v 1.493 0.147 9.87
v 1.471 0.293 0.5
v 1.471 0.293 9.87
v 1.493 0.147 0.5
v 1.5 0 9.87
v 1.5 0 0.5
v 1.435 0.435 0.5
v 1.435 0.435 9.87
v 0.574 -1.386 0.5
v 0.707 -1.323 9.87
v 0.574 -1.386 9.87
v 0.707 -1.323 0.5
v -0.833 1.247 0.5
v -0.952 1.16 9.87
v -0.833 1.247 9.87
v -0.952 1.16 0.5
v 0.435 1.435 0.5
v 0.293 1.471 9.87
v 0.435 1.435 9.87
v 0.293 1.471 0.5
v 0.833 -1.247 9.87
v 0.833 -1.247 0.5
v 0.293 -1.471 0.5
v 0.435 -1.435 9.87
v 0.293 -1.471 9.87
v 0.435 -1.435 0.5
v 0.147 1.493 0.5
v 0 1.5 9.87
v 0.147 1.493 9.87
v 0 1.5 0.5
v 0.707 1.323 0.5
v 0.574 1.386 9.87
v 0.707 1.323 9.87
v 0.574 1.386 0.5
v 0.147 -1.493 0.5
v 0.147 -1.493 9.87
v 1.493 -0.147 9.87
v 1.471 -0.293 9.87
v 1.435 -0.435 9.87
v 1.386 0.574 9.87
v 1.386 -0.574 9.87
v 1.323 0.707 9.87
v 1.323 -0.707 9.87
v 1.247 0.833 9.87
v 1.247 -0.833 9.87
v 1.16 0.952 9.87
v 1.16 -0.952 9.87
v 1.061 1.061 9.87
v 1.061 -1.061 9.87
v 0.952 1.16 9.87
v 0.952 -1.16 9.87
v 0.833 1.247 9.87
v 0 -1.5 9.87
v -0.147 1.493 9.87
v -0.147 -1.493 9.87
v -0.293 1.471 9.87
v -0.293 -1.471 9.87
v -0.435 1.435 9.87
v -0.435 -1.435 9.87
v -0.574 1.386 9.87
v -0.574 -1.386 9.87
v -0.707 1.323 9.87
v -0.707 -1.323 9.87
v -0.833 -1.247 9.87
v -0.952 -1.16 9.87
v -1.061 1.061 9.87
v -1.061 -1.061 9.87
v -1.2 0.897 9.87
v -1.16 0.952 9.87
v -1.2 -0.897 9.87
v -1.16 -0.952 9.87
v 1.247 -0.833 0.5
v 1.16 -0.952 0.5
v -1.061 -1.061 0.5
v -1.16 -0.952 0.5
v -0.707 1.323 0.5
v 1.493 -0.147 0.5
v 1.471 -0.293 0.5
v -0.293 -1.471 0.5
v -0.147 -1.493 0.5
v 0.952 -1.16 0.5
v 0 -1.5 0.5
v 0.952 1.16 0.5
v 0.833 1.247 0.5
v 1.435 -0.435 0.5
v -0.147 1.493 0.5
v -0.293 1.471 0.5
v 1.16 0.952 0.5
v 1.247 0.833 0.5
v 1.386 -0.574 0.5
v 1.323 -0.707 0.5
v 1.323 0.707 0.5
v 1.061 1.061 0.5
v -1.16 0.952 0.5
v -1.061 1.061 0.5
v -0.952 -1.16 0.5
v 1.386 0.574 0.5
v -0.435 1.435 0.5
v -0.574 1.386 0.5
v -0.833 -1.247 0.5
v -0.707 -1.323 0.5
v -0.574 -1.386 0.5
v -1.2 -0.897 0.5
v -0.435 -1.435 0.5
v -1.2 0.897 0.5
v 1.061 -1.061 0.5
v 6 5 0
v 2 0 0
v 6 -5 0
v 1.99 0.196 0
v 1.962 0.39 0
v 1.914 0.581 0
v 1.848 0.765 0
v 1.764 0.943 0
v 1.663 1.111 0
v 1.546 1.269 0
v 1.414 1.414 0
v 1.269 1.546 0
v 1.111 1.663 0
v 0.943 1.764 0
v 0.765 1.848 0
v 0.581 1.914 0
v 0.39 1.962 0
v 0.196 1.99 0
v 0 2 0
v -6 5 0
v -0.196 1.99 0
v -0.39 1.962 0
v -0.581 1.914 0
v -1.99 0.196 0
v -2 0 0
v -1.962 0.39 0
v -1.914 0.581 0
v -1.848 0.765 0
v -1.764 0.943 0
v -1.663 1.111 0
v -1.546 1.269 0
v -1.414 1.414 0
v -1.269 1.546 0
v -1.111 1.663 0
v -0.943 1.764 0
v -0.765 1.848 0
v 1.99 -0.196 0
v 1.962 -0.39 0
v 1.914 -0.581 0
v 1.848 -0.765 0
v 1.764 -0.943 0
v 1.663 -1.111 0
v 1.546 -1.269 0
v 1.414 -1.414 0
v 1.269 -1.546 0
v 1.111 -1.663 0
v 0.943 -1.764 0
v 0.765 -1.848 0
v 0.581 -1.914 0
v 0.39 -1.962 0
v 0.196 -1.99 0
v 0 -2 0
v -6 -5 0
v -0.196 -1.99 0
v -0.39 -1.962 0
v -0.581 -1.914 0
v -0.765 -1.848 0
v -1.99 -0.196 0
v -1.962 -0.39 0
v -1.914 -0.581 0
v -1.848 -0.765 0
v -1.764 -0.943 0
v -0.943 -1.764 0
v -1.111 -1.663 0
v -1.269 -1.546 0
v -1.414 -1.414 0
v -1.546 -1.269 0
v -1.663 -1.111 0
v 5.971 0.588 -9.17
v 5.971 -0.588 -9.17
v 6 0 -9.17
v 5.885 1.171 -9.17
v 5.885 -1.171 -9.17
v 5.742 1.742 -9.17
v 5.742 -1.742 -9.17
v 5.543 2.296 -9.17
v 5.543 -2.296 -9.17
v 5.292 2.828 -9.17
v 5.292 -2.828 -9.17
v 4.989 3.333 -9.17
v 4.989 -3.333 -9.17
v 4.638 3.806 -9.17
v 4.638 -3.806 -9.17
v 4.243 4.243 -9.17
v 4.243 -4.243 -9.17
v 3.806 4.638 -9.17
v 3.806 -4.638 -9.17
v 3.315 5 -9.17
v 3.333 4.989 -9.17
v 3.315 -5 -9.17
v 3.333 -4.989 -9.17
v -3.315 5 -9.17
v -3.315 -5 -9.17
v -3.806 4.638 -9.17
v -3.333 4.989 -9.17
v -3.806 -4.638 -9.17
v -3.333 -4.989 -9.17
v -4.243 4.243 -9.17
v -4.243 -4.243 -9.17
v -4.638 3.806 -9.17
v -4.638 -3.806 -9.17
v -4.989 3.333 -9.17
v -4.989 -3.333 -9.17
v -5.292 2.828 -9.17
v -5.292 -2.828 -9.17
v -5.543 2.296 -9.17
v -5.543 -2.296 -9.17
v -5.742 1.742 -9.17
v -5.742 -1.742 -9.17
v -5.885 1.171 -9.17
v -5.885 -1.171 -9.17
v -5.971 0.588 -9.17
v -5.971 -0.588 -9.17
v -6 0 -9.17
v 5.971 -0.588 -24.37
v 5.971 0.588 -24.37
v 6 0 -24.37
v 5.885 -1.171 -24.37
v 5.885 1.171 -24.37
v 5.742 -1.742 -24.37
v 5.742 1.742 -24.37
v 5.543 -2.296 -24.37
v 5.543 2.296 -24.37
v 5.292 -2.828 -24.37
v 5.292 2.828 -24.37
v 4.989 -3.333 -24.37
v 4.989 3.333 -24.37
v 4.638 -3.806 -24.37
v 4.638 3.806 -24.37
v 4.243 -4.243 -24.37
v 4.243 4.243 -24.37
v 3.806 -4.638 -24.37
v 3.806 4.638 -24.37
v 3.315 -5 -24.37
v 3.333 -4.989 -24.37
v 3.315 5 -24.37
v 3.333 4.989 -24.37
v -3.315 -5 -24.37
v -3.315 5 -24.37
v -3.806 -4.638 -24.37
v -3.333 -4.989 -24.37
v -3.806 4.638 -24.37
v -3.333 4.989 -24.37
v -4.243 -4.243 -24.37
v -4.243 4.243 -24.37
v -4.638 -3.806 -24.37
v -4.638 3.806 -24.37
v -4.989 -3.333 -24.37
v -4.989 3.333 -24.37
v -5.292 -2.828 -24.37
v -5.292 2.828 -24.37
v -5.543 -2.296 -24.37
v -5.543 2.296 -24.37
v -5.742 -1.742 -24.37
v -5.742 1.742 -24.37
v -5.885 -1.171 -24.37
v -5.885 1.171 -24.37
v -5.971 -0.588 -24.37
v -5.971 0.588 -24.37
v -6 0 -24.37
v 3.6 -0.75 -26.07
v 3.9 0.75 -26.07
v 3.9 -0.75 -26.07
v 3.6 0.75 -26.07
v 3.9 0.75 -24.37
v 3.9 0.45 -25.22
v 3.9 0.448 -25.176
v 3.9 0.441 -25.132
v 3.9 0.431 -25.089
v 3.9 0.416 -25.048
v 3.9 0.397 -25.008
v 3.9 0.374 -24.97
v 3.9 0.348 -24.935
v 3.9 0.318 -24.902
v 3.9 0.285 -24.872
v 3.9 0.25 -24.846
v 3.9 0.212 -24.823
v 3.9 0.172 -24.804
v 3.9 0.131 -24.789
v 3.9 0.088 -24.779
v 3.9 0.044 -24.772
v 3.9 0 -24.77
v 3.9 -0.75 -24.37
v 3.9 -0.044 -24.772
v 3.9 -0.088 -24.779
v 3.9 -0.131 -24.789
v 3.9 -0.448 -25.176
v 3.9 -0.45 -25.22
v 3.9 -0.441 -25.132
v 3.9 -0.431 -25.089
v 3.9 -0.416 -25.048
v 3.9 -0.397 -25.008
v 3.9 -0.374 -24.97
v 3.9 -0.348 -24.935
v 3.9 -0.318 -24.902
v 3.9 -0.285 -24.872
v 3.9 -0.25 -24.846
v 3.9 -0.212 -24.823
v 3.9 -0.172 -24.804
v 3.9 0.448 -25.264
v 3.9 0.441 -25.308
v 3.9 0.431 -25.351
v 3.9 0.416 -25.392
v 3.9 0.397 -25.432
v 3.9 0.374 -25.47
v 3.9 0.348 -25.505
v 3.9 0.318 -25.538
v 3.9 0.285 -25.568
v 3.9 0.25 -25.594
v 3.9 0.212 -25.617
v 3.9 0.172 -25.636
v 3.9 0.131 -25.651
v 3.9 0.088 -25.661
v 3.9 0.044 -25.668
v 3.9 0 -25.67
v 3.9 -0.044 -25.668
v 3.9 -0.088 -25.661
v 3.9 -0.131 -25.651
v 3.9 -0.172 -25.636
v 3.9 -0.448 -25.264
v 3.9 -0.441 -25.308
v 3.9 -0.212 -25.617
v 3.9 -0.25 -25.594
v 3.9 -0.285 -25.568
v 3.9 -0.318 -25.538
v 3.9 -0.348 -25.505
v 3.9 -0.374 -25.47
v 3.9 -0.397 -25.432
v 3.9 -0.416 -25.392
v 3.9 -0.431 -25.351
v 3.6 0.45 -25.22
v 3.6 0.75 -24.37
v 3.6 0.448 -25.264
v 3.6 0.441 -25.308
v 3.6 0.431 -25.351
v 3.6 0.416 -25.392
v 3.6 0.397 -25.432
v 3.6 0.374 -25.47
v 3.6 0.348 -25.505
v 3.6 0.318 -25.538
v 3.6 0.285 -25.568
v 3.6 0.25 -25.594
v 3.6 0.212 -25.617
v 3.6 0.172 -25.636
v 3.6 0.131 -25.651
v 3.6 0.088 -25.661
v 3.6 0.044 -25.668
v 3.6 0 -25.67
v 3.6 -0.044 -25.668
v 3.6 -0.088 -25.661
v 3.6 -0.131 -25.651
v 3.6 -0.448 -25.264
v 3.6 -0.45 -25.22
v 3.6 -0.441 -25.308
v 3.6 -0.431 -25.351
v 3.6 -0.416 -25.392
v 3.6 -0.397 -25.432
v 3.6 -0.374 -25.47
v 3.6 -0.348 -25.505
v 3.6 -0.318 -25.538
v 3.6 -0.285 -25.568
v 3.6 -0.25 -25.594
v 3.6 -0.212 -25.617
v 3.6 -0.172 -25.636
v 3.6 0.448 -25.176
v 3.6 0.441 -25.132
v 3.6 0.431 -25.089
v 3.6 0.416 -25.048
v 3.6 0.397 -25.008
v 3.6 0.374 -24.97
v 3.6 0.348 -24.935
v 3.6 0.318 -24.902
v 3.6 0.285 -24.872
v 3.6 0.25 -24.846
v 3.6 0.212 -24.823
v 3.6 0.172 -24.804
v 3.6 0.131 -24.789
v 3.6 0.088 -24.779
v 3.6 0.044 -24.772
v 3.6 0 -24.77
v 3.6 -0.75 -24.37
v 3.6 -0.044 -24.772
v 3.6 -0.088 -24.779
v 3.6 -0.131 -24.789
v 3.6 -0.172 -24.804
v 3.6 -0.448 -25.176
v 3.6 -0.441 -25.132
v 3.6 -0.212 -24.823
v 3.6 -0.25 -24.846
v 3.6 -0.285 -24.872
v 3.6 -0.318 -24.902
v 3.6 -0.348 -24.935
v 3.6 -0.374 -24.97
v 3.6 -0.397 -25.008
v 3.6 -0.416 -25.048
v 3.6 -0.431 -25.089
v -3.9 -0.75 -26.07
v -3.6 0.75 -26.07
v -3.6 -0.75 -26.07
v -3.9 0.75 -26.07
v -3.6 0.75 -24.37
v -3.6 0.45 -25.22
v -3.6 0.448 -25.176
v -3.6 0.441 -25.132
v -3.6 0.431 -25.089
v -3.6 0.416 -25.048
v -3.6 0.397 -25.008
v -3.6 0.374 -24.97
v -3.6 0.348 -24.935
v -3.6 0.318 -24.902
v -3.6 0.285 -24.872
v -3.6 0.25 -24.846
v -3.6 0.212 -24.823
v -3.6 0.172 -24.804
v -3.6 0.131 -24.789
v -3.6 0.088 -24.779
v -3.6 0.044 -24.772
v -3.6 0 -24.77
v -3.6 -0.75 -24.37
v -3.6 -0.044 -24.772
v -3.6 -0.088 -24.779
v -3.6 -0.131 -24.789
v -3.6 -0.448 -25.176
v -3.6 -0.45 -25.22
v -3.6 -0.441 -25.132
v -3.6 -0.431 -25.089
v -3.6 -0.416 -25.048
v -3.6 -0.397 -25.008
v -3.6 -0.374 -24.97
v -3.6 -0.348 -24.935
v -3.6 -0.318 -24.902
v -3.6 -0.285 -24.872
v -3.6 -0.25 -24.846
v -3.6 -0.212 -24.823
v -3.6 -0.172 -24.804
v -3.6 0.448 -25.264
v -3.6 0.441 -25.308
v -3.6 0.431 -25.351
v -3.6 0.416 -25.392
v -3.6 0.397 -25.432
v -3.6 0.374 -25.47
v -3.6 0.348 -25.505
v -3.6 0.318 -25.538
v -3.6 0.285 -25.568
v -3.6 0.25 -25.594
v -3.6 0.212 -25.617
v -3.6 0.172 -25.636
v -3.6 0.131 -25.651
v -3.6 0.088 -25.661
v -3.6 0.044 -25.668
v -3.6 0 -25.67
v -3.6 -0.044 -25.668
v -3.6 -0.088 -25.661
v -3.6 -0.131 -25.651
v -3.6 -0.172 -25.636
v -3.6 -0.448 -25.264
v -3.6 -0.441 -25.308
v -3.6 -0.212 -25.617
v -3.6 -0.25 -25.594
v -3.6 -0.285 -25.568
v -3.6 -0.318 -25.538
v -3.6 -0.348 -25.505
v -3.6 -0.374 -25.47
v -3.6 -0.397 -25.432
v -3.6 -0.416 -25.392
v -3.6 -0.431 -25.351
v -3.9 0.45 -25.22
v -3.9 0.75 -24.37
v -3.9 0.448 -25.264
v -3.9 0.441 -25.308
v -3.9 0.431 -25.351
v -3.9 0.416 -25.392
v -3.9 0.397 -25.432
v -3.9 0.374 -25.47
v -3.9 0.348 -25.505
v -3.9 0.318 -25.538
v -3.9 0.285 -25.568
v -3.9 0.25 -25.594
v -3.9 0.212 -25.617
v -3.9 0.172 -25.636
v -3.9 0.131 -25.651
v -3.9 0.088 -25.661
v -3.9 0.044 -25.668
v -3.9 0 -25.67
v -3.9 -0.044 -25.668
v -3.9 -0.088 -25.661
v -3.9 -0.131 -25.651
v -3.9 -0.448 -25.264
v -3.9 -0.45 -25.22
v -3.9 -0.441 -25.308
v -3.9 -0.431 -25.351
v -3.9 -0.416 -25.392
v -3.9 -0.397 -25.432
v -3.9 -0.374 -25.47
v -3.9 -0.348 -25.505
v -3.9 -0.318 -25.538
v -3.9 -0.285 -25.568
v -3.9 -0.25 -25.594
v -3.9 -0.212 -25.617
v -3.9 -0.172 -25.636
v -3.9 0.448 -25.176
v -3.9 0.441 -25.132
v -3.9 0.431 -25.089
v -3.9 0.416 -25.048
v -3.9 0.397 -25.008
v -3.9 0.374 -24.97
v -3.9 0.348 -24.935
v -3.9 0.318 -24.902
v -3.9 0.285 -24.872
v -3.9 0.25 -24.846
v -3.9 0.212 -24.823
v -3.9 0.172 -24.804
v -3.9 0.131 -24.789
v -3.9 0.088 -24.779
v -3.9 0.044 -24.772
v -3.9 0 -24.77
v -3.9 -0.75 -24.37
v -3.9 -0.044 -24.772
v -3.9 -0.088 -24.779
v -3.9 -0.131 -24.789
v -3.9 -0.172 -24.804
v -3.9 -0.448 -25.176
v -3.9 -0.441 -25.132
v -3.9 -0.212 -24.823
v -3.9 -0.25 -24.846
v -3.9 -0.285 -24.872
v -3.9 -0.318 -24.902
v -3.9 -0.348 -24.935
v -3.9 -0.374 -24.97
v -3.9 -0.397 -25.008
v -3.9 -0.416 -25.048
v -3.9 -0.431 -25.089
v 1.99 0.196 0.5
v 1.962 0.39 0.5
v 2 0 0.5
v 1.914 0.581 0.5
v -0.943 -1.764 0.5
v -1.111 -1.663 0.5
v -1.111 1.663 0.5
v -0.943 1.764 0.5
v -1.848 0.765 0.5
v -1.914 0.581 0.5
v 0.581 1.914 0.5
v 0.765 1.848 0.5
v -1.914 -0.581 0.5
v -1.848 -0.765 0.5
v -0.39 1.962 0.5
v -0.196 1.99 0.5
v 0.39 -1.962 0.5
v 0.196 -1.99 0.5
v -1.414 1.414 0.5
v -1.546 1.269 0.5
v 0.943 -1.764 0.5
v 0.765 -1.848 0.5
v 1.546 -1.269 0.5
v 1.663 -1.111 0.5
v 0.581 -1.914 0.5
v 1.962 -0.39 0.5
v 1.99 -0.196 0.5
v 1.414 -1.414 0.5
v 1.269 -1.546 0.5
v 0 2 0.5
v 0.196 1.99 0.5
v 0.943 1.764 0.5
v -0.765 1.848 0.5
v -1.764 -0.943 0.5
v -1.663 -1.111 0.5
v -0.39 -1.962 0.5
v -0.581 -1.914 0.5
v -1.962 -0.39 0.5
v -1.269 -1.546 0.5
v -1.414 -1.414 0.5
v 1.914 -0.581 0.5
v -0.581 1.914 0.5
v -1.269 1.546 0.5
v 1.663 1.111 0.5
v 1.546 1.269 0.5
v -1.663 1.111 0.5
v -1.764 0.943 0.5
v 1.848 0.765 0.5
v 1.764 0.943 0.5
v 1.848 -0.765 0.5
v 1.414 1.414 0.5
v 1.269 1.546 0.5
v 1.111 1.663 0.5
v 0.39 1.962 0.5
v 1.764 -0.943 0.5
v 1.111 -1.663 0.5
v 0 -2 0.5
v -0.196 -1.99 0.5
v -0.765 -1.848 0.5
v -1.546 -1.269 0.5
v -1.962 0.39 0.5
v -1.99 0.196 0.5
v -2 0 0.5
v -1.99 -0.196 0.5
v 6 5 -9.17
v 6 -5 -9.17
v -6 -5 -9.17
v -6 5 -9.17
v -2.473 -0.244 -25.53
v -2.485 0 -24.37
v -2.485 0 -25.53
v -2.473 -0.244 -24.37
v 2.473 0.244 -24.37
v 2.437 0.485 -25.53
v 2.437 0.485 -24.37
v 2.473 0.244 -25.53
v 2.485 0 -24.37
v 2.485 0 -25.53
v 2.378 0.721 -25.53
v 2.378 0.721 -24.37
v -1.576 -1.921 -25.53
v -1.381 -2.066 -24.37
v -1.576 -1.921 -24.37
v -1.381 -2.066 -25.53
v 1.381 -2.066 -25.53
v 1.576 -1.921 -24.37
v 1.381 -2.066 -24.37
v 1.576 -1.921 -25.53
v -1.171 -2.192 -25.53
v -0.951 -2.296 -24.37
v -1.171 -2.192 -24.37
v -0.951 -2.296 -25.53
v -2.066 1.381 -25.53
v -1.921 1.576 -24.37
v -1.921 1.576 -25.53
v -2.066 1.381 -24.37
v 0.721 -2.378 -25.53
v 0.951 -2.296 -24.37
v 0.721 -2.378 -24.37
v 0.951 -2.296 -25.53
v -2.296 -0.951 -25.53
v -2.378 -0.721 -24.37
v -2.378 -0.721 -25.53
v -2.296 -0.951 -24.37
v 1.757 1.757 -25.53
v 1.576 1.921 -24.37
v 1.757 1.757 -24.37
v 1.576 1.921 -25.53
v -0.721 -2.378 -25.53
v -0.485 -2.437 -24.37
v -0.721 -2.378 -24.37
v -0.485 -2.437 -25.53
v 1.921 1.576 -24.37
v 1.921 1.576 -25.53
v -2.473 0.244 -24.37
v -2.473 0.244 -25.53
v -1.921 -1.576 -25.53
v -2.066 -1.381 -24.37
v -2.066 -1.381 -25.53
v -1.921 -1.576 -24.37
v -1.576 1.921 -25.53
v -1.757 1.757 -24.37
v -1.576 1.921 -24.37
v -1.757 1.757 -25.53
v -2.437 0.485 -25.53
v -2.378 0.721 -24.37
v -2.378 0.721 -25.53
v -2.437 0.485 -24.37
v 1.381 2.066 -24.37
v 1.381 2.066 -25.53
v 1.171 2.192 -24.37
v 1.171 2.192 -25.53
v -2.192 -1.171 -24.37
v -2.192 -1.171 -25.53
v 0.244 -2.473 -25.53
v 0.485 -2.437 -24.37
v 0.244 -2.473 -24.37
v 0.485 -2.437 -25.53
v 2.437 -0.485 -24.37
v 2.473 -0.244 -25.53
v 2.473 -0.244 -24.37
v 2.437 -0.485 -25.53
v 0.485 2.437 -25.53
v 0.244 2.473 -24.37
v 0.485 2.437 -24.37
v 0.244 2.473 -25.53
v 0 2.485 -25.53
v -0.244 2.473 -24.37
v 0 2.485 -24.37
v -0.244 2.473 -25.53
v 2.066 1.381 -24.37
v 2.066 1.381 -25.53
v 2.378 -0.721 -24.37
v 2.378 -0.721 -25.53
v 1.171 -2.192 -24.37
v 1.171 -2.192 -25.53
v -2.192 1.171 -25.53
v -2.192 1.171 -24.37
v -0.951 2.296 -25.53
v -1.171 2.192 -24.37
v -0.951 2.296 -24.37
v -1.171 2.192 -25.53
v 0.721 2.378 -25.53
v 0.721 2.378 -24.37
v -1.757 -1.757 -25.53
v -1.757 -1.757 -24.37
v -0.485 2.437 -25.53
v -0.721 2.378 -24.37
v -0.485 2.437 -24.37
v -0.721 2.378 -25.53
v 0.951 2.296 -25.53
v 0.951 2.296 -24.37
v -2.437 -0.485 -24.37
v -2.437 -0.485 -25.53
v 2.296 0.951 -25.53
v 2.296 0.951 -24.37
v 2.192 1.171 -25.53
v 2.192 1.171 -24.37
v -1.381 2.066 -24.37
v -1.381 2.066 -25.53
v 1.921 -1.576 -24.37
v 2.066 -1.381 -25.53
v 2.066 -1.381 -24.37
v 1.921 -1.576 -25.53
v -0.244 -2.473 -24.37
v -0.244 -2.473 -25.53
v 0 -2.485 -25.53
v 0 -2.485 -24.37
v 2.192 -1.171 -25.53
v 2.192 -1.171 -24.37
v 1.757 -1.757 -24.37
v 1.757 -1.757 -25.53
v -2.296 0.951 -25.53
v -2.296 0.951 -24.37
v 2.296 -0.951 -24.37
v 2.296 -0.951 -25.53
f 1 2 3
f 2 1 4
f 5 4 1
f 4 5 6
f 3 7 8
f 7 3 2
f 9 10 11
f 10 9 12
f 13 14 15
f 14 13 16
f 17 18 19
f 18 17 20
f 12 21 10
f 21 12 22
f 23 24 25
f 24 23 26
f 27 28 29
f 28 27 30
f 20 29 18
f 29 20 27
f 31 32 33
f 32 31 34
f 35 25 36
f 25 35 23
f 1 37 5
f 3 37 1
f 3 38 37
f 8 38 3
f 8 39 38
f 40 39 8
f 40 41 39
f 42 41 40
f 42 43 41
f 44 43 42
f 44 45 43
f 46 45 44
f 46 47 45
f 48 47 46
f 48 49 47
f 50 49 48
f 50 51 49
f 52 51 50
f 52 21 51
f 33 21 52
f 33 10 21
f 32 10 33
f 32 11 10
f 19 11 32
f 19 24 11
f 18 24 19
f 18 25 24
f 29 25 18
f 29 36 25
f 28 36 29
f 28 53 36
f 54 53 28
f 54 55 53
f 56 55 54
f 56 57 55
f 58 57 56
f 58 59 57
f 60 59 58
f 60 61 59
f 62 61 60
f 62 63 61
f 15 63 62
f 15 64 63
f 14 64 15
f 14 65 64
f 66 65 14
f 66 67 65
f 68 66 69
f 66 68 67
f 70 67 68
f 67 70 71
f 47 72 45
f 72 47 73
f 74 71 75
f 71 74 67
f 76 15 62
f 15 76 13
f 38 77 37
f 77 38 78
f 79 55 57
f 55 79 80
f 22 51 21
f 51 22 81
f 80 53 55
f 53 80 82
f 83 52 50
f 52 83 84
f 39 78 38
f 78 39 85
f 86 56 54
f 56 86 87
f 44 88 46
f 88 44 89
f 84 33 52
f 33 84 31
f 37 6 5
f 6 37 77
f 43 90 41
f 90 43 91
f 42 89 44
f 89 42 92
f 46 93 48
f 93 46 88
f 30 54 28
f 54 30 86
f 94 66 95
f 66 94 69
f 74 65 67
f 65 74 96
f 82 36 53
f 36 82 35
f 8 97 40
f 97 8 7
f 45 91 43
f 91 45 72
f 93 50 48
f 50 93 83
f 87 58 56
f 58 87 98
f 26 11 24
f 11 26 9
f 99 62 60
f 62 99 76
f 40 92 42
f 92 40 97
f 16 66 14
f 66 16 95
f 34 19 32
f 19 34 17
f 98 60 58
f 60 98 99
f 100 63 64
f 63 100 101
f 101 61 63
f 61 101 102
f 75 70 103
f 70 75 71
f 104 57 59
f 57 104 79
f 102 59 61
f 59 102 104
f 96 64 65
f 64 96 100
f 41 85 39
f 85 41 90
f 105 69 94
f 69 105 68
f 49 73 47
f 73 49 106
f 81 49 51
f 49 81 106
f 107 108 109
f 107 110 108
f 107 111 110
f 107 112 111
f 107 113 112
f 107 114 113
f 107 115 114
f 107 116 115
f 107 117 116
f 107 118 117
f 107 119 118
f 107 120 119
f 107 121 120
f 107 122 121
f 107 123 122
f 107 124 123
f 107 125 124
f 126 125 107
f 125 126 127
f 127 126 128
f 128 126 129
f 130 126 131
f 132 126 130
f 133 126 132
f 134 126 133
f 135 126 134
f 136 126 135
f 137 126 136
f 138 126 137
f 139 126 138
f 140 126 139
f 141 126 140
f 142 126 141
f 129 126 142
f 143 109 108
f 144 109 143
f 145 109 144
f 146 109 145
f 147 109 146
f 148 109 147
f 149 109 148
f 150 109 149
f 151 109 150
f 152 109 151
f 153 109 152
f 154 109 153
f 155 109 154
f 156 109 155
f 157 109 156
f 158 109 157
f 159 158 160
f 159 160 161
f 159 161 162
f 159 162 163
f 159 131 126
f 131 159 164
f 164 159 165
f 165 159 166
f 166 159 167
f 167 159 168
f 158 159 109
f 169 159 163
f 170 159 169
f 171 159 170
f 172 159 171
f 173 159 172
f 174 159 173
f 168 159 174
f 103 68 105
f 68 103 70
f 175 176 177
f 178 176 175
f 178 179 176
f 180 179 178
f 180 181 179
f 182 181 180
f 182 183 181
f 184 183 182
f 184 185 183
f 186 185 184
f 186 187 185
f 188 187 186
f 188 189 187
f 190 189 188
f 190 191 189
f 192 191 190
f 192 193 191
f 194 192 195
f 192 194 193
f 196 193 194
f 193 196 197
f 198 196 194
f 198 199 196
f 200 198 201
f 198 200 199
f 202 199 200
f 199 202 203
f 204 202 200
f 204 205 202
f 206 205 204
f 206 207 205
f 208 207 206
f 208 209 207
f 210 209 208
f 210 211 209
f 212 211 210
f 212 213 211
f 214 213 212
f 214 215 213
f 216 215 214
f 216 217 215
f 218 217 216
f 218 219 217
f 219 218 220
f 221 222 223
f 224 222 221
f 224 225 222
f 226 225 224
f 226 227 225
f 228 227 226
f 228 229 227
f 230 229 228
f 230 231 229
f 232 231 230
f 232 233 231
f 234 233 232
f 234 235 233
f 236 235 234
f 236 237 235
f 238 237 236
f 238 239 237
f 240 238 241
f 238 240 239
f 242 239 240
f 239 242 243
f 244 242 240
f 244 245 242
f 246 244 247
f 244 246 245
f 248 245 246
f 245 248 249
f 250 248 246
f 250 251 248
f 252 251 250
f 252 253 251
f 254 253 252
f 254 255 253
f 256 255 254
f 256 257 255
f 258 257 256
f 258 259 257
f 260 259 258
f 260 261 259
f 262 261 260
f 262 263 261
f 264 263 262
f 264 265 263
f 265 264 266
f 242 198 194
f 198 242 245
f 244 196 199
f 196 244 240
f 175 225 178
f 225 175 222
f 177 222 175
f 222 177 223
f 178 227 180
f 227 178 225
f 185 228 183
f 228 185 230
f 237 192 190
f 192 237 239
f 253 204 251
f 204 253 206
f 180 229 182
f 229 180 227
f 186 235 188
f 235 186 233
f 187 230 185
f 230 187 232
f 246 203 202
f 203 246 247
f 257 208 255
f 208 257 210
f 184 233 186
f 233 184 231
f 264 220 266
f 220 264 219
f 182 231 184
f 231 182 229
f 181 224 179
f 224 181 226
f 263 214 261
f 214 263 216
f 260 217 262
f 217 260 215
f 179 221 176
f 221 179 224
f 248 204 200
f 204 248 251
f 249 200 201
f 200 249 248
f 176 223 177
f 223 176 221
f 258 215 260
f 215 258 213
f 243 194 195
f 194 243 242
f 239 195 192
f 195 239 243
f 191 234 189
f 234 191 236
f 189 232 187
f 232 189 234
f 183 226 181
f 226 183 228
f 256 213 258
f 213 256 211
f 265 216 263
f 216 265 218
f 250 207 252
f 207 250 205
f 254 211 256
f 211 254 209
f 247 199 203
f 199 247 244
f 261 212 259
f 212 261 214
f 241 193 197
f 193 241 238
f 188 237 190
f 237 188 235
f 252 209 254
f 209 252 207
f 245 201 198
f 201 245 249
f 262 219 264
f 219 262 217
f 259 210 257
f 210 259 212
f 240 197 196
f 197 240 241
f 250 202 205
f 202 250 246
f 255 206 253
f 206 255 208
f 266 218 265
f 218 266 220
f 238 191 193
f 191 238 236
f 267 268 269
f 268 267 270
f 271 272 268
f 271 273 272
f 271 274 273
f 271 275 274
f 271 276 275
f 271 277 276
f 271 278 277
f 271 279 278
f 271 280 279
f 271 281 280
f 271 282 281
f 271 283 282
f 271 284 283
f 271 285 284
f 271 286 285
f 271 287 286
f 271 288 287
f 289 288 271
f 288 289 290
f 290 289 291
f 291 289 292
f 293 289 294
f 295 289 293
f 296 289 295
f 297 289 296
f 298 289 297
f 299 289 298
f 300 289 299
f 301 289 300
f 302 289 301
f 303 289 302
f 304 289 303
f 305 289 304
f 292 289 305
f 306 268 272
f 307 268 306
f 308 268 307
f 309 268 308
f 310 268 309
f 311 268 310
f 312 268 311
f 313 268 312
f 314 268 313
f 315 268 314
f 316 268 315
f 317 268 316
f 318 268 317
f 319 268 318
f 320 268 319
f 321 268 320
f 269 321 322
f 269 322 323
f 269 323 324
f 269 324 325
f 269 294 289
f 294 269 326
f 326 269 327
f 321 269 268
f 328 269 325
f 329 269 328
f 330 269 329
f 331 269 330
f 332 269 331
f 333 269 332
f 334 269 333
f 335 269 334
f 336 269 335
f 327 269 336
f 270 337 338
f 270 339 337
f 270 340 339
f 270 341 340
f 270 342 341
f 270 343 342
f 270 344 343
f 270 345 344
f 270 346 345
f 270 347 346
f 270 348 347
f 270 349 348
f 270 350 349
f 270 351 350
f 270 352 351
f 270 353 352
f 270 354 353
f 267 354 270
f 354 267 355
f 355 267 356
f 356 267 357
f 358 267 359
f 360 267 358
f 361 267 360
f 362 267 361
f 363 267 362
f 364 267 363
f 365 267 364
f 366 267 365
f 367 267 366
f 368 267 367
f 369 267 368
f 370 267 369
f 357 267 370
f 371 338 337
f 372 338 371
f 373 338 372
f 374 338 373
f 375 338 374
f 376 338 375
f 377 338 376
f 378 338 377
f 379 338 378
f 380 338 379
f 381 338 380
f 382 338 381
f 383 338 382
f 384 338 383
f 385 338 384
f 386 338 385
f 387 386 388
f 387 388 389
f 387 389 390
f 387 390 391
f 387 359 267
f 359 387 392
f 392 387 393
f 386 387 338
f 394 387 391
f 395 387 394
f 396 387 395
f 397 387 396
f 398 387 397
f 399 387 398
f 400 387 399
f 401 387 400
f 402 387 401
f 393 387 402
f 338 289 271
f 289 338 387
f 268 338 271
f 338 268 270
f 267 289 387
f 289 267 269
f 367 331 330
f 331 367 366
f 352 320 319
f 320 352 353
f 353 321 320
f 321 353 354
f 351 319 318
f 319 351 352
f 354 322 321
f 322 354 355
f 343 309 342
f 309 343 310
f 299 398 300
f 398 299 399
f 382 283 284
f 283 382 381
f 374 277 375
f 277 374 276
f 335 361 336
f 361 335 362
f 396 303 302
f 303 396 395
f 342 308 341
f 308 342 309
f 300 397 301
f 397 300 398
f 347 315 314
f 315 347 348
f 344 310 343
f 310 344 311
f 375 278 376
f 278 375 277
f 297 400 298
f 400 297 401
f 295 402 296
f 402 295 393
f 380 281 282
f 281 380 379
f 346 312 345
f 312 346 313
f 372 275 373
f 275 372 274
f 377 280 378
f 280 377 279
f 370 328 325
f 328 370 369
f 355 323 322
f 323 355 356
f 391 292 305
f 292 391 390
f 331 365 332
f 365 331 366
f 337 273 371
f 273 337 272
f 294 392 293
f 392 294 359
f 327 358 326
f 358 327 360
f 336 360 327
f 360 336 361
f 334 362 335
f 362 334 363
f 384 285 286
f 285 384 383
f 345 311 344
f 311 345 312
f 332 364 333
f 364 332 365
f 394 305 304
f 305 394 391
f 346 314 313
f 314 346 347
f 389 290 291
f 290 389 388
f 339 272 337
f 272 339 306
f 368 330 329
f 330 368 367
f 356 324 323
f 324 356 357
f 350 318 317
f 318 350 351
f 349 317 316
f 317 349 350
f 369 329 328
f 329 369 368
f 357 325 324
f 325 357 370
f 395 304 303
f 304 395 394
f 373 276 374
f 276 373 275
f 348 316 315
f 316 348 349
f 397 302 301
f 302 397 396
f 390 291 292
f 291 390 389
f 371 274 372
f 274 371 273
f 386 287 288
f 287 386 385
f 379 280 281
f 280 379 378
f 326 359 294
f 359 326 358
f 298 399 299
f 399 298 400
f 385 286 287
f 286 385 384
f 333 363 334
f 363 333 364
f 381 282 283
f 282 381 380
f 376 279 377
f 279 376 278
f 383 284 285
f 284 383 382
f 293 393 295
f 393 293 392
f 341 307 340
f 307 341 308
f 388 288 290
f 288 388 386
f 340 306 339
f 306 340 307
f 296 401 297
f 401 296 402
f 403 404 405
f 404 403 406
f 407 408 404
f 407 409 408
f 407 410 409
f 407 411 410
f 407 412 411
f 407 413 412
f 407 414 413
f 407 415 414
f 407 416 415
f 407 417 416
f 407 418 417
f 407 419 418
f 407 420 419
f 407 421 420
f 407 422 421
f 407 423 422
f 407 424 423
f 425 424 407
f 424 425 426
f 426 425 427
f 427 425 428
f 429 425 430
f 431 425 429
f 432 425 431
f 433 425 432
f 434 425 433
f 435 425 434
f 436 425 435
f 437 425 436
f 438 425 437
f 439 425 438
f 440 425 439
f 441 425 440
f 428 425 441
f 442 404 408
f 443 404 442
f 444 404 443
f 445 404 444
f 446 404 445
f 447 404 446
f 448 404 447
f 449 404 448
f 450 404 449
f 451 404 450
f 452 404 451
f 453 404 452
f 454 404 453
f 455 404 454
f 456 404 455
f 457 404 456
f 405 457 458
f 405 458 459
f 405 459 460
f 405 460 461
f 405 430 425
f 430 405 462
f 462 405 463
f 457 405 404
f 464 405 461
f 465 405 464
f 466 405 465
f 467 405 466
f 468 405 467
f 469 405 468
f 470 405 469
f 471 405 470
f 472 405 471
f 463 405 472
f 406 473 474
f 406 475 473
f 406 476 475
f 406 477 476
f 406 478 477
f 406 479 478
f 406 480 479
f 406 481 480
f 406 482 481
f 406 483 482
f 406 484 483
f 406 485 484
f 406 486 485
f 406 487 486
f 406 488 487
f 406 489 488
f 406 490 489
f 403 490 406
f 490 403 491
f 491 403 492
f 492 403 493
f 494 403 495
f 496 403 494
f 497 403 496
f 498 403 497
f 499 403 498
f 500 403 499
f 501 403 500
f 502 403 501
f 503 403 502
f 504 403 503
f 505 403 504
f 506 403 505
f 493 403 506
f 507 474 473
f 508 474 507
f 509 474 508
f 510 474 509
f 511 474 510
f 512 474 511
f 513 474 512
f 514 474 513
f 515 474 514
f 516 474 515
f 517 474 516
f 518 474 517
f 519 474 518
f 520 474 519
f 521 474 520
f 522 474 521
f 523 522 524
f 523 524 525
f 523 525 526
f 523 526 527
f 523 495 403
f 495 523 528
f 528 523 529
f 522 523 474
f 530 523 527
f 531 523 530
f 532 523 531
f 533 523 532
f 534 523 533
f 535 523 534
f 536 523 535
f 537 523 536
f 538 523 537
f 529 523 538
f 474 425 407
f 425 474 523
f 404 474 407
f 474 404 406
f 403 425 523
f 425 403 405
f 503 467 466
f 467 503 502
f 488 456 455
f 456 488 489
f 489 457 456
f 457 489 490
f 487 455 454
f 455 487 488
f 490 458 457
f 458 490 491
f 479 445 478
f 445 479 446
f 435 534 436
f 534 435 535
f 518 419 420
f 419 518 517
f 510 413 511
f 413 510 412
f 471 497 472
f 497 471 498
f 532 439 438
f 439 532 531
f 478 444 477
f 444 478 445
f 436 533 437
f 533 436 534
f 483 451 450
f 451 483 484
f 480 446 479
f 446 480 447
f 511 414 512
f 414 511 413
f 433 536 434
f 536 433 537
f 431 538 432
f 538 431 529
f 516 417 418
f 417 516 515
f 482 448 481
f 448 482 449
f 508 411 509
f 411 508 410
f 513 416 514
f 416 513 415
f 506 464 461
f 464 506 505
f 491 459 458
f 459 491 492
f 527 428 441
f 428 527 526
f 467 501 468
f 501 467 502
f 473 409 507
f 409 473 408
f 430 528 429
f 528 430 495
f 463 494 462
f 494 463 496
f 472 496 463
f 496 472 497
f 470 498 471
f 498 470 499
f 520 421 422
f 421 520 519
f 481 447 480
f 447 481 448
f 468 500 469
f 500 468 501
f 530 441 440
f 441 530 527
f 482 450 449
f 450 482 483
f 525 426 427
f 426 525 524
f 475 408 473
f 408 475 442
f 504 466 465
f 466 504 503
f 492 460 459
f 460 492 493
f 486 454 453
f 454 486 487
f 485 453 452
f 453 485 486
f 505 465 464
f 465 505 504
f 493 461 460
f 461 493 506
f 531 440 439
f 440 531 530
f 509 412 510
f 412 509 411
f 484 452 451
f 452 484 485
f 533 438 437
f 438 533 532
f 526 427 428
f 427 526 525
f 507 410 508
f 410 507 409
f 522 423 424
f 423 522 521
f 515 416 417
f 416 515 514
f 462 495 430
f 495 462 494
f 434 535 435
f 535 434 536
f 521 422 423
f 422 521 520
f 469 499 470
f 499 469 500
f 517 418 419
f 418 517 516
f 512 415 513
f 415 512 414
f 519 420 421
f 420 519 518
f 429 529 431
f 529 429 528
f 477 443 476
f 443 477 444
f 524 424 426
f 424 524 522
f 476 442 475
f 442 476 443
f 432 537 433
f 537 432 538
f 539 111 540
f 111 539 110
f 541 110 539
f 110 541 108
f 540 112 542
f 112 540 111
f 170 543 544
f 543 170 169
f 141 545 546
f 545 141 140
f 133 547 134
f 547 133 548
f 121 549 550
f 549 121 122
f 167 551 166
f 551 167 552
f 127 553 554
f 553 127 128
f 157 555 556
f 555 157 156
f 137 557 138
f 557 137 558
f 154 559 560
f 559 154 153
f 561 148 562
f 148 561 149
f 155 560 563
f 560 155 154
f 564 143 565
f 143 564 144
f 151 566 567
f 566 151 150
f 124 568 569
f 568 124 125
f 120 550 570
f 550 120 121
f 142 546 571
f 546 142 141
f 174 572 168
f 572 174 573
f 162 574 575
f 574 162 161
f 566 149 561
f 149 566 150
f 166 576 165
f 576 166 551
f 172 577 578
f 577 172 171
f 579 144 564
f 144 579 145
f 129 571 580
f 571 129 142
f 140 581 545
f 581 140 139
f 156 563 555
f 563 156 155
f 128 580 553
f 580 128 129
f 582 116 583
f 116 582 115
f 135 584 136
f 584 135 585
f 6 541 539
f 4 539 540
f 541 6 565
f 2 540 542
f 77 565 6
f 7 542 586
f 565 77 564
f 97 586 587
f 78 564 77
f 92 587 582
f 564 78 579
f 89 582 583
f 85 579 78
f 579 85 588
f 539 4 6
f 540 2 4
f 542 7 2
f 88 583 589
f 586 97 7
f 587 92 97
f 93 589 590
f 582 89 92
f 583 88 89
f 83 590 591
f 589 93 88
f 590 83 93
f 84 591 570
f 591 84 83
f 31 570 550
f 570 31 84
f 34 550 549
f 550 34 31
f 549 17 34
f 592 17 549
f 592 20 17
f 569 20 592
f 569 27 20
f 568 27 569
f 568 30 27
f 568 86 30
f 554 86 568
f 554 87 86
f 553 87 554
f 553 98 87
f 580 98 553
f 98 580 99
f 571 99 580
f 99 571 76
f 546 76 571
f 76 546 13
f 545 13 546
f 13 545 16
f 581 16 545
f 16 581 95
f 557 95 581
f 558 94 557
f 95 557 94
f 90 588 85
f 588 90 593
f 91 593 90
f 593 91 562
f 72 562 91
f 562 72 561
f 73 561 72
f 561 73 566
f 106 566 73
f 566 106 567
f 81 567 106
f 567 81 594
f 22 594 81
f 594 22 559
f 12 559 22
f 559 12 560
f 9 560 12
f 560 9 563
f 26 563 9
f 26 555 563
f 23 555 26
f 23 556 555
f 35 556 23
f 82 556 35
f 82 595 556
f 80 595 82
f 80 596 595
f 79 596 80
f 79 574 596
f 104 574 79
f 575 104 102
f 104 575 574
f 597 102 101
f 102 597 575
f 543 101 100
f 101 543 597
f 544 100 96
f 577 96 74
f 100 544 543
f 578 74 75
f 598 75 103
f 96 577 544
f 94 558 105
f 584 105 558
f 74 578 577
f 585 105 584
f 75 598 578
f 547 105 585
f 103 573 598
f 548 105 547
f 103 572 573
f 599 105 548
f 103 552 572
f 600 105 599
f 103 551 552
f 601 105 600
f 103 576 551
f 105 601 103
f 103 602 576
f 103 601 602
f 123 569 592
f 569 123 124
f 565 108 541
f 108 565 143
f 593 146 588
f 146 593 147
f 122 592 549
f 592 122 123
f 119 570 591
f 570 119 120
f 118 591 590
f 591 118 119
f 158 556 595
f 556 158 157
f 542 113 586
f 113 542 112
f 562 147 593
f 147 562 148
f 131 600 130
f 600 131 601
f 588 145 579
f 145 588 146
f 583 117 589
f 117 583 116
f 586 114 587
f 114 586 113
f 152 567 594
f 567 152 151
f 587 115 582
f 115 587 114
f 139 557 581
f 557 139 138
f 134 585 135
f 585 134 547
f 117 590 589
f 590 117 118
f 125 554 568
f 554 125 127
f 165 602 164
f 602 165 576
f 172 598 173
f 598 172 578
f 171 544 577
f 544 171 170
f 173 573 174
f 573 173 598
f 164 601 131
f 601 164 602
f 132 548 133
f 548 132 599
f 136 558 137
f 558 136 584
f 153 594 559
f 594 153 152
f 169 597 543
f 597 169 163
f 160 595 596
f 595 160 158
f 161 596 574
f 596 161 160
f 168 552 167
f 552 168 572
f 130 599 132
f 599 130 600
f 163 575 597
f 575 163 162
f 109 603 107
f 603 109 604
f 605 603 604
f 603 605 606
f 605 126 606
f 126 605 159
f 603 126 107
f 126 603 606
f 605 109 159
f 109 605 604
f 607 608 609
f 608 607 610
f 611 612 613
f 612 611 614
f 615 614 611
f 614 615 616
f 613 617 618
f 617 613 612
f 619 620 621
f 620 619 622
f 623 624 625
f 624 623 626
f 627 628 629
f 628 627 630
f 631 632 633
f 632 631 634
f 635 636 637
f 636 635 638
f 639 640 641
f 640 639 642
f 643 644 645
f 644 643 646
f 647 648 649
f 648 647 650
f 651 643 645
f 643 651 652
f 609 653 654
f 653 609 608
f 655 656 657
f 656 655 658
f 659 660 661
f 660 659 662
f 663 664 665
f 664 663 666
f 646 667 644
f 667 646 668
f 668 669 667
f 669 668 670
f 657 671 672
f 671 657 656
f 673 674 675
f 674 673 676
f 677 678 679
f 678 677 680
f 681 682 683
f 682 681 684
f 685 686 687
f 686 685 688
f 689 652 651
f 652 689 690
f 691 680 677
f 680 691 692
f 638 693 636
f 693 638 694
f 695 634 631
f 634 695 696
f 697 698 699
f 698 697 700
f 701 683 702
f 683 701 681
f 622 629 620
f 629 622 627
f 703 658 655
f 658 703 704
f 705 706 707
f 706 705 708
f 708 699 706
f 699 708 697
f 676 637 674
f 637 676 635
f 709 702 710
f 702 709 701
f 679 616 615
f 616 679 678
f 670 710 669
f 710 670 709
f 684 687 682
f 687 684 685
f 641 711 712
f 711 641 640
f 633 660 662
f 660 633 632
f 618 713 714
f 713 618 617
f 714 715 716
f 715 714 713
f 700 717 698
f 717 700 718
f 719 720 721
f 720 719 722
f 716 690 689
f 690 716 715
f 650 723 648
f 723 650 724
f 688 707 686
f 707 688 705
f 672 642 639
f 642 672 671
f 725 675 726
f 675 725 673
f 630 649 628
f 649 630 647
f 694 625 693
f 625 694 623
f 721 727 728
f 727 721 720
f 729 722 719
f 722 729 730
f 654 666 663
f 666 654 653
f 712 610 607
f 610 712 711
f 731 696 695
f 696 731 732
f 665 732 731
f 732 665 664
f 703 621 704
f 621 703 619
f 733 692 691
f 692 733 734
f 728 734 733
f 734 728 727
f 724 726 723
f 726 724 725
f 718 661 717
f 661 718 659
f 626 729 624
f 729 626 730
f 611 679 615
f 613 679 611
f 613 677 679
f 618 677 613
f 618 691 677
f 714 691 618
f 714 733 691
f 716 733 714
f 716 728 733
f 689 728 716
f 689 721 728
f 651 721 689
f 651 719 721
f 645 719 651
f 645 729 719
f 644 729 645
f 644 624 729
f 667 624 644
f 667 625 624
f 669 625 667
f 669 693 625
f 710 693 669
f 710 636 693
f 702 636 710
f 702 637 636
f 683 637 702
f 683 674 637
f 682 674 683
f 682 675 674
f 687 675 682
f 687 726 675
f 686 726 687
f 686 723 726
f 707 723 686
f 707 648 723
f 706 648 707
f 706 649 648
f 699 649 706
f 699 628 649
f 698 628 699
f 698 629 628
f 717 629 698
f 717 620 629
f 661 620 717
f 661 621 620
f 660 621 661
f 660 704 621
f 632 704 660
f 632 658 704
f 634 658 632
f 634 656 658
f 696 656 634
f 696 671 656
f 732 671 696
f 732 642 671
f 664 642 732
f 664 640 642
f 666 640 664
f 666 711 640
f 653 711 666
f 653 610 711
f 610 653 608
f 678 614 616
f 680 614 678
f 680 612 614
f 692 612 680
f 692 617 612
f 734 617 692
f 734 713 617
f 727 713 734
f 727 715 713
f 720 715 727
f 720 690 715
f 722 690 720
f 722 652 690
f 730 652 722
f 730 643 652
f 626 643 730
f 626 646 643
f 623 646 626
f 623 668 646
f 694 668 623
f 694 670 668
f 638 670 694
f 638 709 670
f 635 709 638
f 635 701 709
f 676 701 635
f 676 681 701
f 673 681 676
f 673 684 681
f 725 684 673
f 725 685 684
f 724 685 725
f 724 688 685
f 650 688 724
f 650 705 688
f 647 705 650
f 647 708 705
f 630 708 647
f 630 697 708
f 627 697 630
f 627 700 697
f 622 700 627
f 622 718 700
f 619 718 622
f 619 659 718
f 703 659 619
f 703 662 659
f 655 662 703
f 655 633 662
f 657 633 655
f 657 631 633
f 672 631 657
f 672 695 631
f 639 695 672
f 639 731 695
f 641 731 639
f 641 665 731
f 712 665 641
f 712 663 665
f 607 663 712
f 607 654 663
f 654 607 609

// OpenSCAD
motor_diameter = 12;
motor_width    = 10;
motor_length   = 15.2;
motor_nub_length   = 1.16;
motor_nub_diameter = 4.97;

gearbox_length = 9.17;
gearbox_nub_diameter = 4.0;
gearbox_nub_length   = 0.50;

axle_diameter = 3.00;
axle_length   = 9.87;
axle_flat     = 2.40;

contact_width  = 1.50;
contact_length = 1.70;
contact_thickness = 0.30;
contact_hole      = 0.90;
contact_separation = 7.50;

screw_separation = 9.00;
screw_diameter   = 1.50;

// Origin = center of axle, face of gearbox.
// Axle = Z+
// Motor flat = Y+-
MicroMotorGearboxN20($fn=64);
module MicroMotorGearboxN20() {
	// Axle and flat face
	intersection() {
		cylinder(d=axle_diameter, h=axle_length);
		translate([axle_diameter-axle_flat/2, 0, 0])
			cube([2*axle_diameter, 2*axle_diameter, axle_length*3], center=true);
	}
	
	// Gearbox Nub\
	cylinder(d=gearbox_nub_diameter, h=gearbox_nub_length);
	
	// Gearbox
	translate([0, 0, -gearbox_length/2]) cube([motor_diameter, motor_width, gearbox_length], center=true);
	
	// Motor body
	translate([0, 0, -gearbox_length -motor_length/2]) intersection() {
		cube([motor_diameter, motor_width, motor_length], center=true);
		cylinder(d=motor_diameter, h=motor_length, center=true);
	}
	
	// Motor back nub
	translate([0, 0, -gearbox_length -motor_length - motor_nub_length/2]) 
		cylinder(d=motor_nub_diameter, h=motor_nub_length, center=true);
	
	// Contacts
	translate([+contact_separation/2, 0, -gearbox_length -motor_length]) _contact();
	translate([-contact_separation/2, 0, -gearbox_length -motor_length]) _contact();

	module _contact() {
		rotate([0,90,0]) {
			difference() {
				translate([0, -contact_width/2, -contact_thickness/2])
					cube([contact_length, contact_width, contact_thickness]);
				translate([contact_length/2,0,0])
					cylinder(d=contact_hole, h=contact_thickness*2, center = true);
			}
		}
	}
}
